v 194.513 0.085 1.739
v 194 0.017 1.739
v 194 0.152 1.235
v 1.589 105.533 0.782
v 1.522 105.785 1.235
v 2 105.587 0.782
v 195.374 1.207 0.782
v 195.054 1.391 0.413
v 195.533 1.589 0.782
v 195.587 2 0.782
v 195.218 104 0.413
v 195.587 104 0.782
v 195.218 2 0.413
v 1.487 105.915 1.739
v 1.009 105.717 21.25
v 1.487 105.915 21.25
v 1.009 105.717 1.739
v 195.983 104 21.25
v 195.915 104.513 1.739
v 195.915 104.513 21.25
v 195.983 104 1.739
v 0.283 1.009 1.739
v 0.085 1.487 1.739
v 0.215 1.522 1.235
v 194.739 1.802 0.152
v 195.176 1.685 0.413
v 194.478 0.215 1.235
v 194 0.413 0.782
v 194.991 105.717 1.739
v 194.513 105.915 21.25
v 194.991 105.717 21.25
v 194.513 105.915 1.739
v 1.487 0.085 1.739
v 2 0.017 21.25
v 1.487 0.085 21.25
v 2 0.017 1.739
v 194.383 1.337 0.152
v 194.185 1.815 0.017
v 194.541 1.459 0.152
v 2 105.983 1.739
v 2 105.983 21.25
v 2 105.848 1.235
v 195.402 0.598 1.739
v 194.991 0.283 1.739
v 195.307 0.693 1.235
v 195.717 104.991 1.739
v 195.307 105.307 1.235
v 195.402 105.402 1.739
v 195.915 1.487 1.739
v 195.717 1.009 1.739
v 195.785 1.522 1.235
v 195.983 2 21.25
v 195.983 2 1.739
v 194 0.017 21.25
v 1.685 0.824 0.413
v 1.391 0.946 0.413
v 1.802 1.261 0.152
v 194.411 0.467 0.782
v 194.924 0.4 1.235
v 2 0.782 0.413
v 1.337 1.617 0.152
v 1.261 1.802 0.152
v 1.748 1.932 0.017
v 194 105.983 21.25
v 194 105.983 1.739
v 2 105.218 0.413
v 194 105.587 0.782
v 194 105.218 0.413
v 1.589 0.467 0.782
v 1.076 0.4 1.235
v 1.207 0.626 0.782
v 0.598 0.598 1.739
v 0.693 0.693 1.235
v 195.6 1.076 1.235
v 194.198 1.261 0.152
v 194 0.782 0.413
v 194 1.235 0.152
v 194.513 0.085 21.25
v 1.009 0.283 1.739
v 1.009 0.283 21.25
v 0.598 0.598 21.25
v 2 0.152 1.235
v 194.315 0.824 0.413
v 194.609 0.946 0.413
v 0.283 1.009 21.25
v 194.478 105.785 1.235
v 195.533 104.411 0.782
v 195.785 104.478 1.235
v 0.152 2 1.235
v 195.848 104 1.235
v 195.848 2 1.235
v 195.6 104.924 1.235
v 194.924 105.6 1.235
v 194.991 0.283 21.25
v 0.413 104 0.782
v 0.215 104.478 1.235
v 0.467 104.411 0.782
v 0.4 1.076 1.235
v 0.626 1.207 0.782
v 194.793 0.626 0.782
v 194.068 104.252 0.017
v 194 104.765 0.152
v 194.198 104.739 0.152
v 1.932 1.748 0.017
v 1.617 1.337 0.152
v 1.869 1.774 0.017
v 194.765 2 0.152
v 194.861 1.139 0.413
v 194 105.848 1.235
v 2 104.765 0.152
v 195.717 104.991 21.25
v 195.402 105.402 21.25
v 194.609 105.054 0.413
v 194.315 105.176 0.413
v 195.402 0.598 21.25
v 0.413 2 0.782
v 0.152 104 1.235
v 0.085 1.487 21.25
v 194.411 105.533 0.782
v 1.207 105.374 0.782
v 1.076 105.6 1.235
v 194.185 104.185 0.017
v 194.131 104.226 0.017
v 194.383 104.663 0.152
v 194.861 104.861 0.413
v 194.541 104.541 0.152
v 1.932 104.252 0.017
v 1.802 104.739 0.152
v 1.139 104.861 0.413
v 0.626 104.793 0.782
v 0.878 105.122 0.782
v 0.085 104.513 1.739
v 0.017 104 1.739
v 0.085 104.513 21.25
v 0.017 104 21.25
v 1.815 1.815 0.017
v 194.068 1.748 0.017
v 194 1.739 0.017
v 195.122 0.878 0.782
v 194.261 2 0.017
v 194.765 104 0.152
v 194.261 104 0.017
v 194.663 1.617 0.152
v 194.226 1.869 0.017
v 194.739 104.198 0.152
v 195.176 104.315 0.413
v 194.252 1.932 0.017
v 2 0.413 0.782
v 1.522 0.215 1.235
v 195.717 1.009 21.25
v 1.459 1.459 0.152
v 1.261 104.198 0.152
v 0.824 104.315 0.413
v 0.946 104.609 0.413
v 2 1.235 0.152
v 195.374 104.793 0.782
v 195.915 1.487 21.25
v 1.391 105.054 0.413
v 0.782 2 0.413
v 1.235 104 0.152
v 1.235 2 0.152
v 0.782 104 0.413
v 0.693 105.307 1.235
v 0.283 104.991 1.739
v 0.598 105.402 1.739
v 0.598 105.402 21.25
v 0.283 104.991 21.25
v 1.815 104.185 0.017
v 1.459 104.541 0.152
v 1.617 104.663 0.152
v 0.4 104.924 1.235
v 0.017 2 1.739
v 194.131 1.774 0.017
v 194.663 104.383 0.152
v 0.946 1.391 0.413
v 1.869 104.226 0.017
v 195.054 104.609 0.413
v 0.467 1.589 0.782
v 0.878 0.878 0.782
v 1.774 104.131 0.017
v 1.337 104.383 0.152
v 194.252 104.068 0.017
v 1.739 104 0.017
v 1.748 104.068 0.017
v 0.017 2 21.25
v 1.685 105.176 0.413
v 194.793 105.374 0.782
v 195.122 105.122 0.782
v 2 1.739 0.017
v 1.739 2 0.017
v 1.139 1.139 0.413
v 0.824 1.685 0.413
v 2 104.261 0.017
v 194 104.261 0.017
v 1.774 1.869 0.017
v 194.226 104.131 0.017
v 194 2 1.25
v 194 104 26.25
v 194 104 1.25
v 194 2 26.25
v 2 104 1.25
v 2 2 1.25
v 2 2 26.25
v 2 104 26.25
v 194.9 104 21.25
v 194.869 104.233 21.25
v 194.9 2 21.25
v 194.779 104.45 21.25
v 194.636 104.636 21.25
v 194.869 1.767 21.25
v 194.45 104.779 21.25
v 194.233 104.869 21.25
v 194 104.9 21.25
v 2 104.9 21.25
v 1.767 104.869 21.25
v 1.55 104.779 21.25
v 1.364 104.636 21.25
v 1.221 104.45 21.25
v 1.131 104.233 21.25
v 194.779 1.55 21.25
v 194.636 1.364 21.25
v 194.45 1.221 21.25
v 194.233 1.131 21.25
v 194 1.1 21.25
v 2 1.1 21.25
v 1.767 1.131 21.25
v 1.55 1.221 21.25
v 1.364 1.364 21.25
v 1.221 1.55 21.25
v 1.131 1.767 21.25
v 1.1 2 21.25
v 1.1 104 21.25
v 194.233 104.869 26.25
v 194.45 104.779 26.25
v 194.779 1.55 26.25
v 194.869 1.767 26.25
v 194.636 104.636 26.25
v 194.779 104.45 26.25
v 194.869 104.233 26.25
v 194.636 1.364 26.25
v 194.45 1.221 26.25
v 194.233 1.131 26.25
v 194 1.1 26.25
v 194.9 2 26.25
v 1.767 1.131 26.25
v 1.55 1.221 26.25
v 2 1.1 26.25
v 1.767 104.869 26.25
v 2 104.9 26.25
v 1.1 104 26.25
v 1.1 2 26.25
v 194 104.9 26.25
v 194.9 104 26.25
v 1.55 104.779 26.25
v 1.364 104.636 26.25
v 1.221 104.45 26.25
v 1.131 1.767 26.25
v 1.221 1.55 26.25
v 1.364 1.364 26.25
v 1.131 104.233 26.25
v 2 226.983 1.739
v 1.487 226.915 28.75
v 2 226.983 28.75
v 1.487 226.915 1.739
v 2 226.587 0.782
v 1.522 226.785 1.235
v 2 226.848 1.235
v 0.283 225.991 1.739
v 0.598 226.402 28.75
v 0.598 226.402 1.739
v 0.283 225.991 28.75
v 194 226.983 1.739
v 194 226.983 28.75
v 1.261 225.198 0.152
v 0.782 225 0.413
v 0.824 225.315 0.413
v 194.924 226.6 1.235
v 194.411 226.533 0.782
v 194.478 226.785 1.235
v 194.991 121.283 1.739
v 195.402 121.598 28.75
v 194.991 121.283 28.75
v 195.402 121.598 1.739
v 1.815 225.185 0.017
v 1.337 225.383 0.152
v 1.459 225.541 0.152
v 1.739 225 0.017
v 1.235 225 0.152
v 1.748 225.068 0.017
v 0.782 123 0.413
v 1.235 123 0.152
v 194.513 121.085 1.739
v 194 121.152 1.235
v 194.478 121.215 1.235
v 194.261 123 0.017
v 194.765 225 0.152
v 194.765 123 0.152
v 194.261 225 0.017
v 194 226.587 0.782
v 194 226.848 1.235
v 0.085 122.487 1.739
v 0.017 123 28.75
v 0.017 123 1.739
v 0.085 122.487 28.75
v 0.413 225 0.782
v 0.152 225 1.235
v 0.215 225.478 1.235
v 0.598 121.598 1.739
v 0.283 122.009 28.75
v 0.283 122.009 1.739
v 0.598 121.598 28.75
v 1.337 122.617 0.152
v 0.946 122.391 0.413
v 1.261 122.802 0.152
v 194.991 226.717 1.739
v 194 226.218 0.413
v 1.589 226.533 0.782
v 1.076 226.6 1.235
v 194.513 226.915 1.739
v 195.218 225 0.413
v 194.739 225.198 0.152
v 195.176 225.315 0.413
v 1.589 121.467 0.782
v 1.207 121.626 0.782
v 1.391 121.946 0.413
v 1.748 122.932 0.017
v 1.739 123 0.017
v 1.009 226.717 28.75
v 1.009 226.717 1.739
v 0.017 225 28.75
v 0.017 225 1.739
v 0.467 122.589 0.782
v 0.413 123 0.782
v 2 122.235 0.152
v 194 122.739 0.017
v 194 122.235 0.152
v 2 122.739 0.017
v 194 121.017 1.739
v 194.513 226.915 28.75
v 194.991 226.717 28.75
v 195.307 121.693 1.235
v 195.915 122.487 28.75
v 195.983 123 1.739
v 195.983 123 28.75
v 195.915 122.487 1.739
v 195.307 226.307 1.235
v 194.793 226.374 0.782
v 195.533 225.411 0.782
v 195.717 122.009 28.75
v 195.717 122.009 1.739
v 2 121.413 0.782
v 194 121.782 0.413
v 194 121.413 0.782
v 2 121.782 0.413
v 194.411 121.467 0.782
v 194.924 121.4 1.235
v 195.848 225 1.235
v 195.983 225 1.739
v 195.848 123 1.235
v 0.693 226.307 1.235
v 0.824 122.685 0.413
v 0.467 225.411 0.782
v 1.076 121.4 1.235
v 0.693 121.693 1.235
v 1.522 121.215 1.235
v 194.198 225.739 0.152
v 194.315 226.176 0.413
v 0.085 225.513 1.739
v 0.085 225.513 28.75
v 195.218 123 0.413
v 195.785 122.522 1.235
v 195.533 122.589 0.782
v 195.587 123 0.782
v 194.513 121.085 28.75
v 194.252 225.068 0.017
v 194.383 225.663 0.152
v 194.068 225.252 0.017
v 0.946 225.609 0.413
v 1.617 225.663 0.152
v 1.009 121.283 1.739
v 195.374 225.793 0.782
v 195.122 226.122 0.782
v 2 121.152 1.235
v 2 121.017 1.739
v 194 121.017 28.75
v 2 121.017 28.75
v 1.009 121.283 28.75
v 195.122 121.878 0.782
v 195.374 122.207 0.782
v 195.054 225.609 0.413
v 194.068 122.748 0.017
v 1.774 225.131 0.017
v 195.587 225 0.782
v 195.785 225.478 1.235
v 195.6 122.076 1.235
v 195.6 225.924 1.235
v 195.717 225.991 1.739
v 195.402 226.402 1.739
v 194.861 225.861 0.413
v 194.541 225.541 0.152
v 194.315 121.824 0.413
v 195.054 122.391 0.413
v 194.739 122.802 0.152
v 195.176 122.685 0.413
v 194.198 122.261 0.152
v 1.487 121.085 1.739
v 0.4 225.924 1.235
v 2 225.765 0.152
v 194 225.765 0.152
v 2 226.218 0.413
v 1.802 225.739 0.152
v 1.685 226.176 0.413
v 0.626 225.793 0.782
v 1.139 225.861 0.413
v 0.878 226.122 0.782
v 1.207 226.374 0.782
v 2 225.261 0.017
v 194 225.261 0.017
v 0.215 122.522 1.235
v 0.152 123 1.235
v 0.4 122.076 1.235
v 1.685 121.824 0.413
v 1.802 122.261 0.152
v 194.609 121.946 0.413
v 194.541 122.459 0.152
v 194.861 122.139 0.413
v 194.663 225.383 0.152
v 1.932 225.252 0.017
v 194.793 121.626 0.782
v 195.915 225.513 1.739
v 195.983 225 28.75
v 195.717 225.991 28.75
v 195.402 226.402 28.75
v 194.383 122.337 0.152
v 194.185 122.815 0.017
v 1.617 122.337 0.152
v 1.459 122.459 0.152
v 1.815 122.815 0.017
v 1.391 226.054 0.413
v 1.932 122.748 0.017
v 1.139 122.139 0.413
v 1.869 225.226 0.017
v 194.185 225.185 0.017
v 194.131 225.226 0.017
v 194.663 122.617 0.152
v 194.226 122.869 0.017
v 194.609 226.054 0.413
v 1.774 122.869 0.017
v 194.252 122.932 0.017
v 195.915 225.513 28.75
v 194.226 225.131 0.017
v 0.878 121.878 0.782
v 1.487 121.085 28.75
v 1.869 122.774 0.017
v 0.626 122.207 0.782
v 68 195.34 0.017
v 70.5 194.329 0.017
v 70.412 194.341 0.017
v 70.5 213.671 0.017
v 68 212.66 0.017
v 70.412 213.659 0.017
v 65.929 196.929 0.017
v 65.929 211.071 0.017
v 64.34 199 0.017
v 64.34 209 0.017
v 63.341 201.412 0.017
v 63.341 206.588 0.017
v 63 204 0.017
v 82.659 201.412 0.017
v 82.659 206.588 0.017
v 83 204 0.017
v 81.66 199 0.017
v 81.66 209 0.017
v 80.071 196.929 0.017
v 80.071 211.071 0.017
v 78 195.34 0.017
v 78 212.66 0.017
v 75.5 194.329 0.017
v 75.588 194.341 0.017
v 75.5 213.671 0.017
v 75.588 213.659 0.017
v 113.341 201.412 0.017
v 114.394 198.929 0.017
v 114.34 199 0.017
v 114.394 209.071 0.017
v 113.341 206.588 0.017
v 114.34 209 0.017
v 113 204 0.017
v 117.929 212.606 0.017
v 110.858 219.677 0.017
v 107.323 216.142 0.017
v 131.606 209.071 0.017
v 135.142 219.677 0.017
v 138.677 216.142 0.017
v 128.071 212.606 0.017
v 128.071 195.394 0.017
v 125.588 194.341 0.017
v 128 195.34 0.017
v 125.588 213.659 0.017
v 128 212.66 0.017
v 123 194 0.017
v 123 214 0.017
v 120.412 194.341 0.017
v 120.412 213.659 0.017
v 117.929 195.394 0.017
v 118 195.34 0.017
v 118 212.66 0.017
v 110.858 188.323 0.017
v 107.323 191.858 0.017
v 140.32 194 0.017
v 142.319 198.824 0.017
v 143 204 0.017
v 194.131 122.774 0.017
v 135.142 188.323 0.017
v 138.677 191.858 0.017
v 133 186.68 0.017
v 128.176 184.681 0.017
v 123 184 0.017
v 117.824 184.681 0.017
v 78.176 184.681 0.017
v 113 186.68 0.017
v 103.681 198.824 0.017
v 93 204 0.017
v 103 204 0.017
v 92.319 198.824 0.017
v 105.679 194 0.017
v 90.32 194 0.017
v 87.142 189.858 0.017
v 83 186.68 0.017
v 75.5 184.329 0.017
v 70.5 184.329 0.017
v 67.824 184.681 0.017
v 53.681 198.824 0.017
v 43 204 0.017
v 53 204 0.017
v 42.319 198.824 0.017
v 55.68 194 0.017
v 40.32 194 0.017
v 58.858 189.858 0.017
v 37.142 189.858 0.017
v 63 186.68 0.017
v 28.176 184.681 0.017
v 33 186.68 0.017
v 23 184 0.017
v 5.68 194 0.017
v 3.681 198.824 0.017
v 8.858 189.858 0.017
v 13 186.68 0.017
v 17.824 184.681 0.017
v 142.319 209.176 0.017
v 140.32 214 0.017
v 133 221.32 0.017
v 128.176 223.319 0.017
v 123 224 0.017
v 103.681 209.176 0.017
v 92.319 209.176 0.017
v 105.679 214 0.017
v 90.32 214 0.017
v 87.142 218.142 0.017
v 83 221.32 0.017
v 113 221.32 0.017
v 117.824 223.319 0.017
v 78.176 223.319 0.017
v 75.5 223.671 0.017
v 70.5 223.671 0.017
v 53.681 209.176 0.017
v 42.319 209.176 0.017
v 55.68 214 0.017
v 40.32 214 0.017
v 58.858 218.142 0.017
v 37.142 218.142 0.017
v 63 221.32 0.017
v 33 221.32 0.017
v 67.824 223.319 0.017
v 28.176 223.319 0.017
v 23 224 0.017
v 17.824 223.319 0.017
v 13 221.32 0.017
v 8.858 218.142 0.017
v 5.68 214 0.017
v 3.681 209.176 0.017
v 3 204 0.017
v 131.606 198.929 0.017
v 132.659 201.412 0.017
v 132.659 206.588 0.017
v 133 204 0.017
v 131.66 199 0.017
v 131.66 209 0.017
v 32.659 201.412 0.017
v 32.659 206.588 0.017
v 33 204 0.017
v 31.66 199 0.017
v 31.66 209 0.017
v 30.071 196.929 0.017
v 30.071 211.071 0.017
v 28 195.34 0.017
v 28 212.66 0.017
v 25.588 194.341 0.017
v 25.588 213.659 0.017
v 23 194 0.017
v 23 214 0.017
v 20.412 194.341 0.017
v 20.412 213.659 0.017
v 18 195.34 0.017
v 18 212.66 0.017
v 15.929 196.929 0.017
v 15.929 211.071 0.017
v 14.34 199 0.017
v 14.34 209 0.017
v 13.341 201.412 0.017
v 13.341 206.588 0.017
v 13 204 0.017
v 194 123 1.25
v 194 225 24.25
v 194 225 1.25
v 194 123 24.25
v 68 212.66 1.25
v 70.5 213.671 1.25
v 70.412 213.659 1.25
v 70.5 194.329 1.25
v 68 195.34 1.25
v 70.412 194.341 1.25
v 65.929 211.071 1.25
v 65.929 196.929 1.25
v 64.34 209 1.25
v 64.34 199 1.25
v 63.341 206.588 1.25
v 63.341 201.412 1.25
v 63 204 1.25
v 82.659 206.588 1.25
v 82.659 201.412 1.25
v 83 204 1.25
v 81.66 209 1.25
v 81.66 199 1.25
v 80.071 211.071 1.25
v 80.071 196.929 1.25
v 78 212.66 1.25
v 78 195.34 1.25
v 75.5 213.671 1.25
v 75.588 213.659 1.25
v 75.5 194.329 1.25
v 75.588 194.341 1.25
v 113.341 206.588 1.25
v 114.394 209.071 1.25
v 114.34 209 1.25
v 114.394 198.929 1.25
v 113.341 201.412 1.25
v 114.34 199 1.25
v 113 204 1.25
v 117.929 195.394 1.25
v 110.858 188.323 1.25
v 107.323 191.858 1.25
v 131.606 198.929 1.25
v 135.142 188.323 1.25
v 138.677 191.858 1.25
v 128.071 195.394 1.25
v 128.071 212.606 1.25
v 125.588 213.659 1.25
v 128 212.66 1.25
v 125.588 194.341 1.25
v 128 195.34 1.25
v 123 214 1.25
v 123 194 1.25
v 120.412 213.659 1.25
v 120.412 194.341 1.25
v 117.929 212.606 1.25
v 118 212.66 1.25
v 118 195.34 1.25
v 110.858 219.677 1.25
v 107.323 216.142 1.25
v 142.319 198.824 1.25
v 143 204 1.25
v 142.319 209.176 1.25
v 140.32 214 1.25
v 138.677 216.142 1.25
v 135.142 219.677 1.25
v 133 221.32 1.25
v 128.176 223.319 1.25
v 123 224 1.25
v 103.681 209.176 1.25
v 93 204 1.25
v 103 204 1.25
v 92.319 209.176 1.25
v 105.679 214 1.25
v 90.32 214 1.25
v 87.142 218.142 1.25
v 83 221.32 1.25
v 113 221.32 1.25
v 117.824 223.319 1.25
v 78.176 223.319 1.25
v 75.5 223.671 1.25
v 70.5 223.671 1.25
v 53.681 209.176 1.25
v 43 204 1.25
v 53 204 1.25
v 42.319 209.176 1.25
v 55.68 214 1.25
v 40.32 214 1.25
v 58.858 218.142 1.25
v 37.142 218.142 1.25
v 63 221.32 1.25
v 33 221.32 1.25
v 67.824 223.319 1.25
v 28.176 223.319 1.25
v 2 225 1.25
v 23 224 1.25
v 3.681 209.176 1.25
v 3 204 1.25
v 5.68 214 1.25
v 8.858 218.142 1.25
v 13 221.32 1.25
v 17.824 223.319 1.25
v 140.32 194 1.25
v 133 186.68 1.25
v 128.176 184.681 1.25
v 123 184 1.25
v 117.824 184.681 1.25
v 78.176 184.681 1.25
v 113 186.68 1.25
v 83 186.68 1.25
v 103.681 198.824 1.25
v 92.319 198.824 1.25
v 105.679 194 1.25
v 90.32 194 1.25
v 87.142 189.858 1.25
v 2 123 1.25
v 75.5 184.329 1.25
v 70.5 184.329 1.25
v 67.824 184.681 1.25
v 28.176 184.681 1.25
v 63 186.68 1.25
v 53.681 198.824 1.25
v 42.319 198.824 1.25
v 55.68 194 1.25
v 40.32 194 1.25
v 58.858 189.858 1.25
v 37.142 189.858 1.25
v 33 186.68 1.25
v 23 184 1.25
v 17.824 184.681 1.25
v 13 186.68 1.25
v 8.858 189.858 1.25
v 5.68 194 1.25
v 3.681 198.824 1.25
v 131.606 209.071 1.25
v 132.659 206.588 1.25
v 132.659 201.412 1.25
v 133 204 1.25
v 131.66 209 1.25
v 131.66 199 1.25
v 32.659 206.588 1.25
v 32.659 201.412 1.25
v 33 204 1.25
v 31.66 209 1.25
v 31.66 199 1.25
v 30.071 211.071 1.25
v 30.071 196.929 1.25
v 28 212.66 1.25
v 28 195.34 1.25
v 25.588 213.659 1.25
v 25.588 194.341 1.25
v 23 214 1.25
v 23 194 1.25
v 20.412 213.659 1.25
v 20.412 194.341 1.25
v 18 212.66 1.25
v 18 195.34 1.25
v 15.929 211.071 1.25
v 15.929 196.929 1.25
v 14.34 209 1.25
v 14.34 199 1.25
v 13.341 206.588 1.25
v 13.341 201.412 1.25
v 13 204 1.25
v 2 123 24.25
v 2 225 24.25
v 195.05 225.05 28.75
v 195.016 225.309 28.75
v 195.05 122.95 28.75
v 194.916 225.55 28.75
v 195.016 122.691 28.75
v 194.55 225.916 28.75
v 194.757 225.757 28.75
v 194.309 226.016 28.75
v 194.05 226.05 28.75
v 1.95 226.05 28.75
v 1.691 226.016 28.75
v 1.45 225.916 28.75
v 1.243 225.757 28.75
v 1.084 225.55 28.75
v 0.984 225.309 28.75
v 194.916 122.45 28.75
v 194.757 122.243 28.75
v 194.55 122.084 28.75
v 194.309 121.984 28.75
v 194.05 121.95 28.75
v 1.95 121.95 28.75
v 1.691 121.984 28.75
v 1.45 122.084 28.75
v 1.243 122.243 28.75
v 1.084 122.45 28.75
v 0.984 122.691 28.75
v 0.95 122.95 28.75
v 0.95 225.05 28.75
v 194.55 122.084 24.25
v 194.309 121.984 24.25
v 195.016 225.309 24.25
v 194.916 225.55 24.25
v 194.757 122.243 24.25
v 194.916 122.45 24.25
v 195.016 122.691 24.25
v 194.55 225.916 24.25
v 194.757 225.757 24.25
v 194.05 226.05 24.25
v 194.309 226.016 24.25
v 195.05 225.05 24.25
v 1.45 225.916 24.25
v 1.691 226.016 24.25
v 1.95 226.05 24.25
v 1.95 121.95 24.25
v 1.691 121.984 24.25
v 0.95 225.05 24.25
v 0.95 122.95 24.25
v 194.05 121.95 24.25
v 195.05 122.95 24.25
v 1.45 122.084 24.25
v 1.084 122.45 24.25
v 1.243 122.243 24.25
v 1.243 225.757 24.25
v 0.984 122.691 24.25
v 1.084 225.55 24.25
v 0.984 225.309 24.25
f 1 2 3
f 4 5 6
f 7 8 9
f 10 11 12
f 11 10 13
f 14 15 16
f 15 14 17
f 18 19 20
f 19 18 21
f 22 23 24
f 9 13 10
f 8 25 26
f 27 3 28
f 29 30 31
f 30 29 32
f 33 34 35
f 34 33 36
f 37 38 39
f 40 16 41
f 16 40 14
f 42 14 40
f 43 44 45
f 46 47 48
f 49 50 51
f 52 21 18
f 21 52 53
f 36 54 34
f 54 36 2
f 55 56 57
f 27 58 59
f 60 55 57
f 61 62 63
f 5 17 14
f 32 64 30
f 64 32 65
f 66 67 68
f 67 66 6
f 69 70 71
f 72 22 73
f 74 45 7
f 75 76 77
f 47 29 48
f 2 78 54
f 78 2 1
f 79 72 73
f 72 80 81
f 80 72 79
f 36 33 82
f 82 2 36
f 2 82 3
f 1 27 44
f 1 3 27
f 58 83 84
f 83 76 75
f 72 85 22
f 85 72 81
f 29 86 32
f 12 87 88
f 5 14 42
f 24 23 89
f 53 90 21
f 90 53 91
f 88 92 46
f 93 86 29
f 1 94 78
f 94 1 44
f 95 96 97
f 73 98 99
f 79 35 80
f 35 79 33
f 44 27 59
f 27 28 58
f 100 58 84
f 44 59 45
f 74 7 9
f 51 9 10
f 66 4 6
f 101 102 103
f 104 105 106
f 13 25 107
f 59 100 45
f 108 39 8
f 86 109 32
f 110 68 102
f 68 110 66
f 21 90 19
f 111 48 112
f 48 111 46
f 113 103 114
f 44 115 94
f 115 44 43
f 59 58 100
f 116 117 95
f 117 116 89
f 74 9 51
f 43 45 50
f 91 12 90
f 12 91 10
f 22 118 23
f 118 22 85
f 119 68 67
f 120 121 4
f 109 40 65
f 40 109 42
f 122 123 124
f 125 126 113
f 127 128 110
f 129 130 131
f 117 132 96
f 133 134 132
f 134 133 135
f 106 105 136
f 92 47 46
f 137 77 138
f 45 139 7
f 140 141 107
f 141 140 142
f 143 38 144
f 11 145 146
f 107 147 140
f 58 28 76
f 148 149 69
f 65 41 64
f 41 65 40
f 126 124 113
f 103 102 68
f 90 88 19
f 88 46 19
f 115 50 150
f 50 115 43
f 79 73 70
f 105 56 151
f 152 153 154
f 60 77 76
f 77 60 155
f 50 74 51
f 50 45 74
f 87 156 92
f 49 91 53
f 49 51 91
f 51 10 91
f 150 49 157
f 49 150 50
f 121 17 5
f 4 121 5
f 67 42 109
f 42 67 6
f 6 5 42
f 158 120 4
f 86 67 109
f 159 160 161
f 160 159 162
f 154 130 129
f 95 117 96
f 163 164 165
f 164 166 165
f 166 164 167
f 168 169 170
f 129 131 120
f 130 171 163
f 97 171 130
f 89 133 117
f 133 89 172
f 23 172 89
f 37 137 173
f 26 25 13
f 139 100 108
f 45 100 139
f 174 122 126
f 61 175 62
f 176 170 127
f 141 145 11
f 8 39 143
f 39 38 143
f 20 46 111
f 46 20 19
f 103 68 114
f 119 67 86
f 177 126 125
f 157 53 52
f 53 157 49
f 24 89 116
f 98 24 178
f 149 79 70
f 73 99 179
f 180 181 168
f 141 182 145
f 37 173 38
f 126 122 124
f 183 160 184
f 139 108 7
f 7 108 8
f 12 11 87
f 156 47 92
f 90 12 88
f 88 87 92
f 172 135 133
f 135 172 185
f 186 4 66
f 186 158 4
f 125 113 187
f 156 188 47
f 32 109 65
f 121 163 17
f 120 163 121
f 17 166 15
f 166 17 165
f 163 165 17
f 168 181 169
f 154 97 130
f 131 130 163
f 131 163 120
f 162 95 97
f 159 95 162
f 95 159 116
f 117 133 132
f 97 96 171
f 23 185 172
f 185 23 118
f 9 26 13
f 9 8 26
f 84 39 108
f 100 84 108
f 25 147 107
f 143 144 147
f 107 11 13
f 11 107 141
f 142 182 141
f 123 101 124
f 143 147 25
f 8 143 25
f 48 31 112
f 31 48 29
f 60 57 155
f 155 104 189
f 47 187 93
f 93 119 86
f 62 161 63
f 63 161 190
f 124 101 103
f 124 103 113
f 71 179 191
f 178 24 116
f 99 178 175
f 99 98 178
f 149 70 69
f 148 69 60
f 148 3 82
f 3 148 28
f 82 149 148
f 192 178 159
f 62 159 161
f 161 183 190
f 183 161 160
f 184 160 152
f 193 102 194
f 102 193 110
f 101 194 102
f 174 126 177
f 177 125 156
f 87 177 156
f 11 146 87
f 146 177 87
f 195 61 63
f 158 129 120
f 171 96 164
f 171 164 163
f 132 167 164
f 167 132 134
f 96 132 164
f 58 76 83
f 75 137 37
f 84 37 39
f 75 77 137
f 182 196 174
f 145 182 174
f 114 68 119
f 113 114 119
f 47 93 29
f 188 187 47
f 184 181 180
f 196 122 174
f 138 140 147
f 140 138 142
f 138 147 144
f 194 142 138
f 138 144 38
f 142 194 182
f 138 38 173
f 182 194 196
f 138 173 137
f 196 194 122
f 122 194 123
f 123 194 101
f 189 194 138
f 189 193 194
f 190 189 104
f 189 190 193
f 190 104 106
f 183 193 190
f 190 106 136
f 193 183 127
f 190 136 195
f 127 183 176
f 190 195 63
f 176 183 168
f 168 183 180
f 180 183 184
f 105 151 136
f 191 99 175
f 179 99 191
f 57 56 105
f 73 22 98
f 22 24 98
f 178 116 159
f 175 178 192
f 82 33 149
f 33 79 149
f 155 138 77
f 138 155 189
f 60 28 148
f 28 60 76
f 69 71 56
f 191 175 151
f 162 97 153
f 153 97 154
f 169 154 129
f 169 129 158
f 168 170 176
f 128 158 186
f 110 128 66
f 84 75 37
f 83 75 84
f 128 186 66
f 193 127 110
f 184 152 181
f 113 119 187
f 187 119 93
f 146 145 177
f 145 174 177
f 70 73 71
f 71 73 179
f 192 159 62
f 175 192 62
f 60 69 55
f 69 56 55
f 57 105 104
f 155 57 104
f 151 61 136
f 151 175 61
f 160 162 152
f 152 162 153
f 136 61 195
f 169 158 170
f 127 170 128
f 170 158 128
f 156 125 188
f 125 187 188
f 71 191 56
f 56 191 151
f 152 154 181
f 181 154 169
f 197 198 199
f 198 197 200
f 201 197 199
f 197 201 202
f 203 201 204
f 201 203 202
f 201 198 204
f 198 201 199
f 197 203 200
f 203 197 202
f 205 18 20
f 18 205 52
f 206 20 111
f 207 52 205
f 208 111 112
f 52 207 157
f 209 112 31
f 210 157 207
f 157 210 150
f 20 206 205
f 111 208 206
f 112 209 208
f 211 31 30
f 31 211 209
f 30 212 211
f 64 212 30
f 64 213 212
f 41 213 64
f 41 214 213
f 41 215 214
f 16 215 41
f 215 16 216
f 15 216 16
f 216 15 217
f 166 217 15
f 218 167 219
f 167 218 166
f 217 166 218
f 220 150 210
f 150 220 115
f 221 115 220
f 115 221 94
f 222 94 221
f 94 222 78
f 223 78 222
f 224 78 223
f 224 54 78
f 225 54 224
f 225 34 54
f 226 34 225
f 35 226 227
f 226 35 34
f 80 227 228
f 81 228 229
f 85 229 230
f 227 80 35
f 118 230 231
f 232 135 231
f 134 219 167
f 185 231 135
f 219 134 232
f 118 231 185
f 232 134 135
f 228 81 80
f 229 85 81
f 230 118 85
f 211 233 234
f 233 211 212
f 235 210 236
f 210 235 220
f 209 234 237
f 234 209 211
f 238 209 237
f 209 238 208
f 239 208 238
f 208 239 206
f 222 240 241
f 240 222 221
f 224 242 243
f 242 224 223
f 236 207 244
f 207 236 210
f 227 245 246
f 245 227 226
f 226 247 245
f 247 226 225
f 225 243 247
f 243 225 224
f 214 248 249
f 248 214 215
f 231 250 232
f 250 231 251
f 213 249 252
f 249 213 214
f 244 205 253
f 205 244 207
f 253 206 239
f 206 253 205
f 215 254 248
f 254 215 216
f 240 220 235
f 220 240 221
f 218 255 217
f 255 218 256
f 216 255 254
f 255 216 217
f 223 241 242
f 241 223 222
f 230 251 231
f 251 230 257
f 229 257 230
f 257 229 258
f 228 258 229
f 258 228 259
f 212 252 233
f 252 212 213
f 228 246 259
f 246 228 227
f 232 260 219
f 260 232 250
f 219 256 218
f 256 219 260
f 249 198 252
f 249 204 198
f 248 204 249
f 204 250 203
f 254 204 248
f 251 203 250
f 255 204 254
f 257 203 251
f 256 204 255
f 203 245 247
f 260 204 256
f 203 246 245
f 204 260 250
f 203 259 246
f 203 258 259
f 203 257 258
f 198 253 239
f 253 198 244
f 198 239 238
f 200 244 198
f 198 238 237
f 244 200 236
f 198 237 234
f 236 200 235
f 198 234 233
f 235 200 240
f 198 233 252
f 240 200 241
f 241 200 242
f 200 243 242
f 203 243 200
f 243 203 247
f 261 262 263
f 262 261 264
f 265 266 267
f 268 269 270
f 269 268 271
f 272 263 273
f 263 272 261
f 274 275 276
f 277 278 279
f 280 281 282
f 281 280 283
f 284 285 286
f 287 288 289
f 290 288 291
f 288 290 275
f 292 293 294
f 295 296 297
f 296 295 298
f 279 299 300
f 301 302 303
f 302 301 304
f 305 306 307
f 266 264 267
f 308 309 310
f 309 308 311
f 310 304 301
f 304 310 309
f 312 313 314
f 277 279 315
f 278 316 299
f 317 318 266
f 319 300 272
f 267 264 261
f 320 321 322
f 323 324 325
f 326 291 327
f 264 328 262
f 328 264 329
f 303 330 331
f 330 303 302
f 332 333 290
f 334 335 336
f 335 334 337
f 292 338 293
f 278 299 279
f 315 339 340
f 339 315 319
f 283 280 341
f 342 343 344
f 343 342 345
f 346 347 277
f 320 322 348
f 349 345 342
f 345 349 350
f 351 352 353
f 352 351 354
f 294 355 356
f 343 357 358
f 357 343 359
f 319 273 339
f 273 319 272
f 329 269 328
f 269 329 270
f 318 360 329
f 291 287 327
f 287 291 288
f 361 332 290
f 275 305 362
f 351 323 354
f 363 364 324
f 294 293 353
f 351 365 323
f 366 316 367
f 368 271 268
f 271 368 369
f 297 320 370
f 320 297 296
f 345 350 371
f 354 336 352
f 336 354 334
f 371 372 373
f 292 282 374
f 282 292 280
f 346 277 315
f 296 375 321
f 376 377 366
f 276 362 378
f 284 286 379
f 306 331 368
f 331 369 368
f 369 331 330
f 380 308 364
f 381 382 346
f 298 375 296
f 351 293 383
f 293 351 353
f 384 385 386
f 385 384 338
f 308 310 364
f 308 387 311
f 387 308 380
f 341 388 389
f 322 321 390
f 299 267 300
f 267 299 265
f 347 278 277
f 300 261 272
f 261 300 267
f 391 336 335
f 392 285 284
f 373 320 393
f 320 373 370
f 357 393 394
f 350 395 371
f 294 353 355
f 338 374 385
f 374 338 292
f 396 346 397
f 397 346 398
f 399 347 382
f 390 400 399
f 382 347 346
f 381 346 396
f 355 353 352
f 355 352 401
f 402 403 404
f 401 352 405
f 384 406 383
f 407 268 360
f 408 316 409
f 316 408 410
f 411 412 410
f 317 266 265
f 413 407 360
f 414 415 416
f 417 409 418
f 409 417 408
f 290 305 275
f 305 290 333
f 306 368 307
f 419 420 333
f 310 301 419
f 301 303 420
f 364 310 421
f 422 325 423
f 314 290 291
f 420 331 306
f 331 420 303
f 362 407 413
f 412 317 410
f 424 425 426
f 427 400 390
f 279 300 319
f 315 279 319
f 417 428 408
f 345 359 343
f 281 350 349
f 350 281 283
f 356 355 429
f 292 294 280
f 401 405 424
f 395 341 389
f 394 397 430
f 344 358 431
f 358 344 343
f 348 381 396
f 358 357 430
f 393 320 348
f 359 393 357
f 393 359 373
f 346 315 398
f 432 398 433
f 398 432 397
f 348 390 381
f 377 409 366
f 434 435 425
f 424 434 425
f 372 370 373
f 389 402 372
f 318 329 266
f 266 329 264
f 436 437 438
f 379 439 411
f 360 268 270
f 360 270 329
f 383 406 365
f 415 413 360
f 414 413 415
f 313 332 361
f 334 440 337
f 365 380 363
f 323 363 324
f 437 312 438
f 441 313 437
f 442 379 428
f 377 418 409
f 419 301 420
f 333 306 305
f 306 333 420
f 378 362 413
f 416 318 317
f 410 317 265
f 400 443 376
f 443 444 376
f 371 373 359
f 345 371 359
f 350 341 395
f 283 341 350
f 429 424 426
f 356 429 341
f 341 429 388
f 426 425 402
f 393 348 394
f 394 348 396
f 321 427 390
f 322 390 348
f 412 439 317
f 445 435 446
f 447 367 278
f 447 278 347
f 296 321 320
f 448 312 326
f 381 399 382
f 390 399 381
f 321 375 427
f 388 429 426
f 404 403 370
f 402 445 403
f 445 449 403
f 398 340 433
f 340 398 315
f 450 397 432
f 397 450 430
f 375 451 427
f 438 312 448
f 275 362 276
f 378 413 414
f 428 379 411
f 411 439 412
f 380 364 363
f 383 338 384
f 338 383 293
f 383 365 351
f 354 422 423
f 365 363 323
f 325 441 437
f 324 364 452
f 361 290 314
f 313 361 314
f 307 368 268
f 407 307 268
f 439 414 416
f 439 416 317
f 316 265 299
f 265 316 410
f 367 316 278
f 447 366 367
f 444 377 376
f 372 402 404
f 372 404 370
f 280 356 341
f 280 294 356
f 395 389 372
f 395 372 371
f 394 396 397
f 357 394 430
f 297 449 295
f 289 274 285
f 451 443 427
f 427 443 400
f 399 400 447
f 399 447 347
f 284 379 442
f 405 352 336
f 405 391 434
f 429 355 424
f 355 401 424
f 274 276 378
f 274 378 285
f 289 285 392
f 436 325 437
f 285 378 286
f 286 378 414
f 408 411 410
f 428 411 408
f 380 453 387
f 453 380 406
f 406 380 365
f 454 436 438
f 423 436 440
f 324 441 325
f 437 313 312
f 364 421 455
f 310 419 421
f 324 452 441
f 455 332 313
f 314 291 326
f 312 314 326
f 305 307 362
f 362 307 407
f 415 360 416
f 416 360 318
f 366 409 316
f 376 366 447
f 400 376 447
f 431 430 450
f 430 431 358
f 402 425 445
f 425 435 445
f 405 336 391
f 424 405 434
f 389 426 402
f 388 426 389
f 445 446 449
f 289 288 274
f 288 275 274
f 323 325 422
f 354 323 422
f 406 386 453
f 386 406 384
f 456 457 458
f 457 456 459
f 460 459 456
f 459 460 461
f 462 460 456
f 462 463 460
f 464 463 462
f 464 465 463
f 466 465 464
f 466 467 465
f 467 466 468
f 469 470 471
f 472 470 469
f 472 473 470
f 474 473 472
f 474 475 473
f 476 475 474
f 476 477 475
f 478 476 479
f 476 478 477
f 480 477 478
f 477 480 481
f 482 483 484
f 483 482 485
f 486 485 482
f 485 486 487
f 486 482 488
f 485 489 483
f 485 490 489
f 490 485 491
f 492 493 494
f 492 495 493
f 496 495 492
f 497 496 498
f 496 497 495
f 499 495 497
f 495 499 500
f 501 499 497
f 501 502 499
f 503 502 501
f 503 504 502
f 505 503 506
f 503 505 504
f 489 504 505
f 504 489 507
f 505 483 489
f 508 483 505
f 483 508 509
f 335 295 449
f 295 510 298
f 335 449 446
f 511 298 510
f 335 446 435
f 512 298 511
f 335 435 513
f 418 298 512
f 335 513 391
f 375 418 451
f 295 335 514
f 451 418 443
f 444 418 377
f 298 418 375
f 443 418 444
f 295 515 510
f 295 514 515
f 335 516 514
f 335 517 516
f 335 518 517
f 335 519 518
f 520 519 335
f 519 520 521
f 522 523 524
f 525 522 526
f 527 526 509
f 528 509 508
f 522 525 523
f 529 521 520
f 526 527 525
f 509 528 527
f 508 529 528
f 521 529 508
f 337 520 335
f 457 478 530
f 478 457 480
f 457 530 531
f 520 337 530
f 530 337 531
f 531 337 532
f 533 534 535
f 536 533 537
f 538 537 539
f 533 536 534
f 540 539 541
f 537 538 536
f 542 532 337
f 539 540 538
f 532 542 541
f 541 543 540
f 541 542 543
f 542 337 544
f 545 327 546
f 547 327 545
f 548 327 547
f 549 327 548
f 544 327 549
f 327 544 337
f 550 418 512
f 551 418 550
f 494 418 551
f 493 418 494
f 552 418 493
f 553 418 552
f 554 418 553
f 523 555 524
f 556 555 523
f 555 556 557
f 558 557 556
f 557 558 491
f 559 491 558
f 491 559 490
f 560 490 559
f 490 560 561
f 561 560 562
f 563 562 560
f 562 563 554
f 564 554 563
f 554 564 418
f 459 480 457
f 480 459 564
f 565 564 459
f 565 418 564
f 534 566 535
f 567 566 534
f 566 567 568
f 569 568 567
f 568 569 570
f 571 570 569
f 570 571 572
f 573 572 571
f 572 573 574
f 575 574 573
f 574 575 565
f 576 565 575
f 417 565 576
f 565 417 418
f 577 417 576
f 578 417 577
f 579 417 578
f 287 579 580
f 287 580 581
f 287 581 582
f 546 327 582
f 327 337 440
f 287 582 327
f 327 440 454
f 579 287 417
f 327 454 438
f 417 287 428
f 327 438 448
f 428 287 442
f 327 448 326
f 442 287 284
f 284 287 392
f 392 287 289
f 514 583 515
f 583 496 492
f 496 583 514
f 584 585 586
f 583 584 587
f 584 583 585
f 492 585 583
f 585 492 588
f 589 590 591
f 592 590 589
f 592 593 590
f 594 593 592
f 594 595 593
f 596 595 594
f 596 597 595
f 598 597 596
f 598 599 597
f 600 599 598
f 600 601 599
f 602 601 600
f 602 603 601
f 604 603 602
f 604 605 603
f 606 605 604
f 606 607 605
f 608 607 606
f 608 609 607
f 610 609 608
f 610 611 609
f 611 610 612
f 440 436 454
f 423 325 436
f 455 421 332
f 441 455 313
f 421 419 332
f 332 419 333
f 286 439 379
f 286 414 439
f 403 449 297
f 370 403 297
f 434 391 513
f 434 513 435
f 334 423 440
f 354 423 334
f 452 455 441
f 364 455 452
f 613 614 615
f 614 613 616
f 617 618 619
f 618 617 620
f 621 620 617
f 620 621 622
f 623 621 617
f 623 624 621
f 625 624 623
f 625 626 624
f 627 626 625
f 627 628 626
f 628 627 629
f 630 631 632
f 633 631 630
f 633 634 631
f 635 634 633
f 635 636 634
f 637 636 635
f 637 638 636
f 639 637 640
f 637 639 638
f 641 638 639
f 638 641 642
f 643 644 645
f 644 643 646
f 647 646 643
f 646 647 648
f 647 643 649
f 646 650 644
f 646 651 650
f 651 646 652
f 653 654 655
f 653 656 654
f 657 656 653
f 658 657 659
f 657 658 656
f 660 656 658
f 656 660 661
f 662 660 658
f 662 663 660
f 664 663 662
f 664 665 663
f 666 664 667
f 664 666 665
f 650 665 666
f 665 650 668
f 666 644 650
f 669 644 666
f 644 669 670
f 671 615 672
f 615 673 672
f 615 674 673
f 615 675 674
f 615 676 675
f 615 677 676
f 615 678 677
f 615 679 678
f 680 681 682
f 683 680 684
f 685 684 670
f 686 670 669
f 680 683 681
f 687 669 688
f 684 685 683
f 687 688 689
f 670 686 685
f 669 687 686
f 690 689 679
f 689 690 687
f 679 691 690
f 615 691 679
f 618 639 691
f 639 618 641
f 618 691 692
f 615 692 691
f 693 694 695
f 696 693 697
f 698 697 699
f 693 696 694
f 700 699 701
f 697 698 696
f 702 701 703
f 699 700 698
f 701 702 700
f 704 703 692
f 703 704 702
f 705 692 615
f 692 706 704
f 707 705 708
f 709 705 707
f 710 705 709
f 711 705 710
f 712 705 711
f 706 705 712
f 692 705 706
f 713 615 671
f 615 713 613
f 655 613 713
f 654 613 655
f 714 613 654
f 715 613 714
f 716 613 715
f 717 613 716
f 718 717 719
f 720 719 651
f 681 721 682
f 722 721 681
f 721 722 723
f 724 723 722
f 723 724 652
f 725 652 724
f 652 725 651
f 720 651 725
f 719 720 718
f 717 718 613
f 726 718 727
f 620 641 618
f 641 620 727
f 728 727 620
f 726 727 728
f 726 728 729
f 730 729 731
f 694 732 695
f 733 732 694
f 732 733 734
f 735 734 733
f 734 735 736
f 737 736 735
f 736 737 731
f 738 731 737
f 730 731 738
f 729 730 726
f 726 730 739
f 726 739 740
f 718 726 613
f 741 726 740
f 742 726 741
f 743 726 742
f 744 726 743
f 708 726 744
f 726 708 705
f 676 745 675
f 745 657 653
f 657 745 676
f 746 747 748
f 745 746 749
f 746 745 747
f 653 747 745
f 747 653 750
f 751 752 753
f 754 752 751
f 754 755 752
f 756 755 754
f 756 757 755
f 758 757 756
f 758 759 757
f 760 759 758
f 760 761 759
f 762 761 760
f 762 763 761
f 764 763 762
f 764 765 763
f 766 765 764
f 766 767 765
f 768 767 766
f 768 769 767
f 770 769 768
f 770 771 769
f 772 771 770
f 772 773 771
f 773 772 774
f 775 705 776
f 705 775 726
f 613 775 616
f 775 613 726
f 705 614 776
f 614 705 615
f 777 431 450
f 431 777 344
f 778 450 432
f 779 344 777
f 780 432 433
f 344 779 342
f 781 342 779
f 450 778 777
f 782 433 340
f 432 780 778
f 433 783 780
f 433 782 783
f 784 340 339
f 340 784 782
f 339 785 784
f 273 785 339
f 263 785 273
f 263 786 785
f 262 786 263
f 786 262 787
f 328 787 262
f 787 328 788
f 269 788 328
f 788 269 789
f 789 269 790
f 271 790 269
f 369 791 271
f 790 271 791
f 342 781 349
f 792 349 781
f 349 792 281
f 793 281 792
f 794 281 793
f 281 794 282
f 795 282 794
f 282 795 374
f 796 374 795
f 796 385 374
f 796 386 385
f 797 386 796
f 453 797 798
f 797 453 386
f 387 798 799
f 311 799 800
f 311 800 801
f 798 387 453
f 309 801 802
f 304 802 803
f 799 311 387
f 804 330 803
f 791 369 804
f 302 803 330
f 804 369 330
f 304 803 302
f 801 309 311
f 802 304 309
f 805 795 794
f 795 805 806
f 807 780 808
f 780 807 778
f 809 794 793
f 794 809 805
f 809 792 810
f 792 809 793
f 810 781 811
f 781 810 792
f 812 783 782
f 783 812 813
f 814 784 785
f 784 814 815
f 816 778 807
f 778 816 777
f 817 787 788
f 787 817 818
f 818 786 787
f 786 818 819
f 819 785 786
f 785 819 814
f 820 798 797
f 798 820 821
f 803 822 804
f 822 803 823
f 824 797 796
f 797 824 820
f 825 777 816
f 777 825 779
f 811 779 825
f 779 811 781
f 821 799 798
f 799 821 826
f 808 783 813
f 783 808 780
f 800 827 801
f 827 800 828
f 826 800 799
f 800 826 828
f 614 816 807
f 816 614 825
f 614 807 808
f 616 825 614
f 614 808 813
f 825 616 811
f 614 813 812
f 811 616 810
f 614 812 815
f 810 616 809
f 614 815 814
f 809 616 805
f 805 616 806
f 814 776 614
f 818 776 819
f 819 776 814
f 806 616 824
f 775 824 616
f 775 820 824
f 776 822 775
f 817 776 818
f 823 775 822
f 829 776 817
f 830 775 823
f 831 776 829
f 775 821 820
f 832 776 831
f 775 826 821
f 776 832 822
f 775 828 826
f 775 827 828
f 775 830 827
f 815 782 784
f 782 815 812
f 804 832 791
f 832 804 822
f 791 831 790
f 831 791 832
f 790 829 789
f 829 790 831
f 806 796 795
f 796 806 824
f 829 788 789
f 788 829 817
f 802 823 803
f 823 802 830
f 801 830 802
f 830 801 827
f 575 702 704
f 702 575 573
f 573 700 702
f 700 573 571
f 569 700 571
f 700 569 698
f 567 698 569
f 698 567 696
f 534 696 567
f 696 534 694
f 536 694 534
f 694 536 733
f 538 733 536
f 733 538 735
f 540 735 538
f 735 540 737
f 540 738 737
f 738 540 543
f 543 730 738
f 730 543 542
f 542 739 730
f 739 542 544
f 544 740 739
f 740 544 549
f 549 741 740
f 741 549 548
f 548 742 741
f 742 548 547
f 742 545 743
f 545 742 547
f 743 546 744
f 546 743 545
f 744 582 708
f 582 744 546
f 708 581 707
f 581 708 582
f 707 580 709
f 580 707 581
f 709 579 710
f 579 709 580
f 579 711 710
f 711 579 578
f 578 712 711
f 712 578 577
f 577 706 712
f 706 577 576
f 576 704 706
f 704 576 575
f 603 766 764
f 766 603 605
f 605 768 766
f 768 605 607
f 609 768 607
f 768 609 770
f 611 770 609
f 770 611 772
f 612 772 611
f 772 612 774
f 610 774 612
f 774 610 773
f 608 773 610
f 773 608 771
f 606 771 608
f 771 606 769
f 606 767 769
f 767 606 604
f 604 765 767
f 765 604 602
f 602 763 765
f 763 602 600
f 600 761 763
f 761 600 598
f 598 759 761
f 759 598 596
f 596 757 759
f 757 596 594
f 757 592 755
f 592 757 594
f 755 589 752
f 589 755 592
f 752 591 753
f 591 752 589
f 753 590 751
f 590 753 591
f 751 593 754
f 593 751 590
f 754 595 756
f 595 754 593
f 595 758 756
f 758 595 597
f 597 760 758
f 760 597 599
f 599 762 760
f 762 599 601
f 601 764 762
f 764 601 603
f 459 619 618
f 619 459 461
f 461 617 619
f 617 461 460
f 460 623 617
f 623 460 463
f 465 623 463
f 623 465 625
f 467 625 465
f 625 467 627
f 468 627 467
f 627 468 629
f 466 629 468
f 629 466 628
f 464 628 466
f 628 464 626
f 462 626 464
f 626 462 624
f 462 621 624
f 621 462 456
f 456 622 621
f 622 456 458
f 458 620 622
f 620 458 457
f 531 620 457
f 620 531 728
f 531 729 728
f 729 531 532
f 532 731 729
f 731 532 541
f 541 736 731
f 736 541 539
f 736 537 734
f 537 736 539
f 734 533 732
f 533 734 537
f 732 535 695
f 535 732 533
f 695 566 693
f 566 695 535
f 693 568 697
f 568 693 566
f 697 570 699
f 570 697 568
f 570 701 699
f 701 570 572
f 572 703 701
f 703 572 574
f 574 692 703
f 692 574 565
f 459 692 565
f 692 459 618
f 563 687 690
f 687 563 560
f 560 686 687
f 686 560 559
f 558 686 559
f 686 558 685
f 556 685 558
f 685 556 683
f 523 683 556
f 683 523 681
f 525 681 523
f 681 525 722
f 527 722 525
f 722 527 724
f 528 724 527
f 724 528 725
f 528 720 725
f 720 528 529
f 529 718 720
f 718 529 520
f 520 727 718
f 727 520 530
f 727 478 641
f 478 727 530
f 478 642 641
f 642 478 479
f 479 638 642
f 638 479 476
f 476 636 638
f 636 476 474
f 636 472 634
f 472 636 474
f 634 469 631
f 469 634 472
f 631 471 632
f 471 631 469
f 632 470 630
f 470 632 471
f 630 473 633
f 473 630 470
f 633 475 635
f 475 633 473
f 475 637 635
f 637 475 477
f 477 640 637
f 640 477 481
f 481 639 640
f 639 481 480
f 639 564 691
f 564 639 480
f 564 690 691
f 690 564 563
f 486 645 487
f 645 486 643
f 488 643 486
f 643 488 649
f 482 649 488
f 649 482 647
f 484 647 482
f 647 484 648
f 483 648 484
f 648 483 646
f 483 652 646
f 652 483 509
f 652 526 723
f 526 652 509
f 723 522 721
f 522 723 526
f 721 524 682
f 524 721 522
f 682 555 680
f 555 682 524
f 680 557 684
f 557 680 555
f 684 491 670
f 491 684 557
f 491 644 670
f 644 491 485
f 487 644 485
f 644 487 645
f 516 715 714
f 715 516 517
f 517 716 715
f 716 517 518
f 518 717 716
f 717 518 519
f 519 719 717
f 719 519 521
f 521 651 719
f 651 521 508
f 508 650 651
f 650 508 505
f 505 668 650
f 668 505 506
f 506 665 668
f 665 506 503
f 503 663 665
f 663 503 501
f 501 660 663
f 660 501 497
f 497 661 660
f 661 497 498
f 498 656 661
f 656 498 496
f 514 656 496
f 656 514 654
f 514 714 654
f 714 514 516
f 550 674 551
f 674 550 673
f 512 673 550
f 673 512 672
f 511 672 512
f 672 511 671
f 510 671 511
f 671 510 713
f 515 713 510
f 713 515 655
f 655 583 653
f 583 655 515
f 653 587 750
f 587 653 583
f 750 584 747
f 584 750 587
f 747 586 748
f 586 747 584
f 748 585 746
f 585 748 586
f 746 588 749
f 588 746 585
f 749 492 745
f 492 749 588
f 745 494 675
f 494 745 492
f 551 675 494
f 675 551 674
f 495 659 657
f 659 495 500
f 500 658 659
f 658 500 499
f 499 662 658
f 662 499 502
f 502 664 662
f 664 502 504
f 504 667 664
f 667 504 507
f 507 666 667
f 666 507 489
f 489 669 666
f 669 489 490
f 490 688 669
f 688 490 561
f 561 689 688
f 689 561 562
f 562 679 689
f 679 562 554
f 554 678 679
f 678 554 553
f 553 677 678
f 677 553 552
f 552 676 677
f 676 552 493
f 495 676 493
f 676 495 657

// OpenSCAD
//-----------------------------------------------------------------------
// Yet Another Parameterized Projectbox generator
//
//  This is a box for <template>
//
//  Version 3.0.5 (03-26-2024)
//
// This design is parameterized based on the size of a PCB.
//
//  You might need to adjust the number of elements:
//
//      Preferences->Advanced->Turn of rendering at 250000 elements
//                                                  ^^^^^^
//
//-----------------------------------------------------------------------

include <../YAPPgenerator_v3.scad>

// Note: length/lengte refers to X axis, 
//       width/breedte to Y, 
//       height/hoogte to Z

/*
            padding-back>|<---- pcb length ---->|<padding-front
                                 RIGHT
                   0    X-ax ---> 
               +----------------------------------------+   ---
               |                                        |    ^
               |                                        |   padding-right 
             ^ |                                        |    v
             | |    -5,y +----------------------+       |   ---              
        B    Y |         | 0,y              x,y |       |     ^              F
        A    - |         |                      |       |     |              R
        C    a |         |                      |       |     | pcb width    O
        K    x |         |                      |       |     |              N
               |         | 0,0              x,0 |       |     v              T
               |   -5,0  +----------------------+       |   ---
               |                                        |    padding-left
             0 +----------------------------------------+   ---
               0    X-ax --->
                                 LEFT
*/


//-- which part(s) do you want to print?
printBaseShell        = true;
printLidShell         = true;
printSwitchExtenders  = false;

//-- pcb dimensions -- very important!!!
pcbLength           = 150; // Front to back
pcbWidth            = 100; // Side to side
pcbThickness        = 1.6;
                            
//-- padding between pcb and inside wall
paddingFront        = 41;
paddingBack         = 1;
paddingRight        = 1;
paddingLeft         = 1;

//-- Edit these parameters for your own box dimensions
wallThickness       = 2.0;
basePlaneThickness  = 1.25;
lidPlaneThickness   = 1.25;

//-- Total height of box = lidPlaneThickness 
//                       + lidWallHeight 
//--                     + baseWallHeight 
//                       + basePlaneThickness
//-- space between pcb and lidPlane :=
//--      (bottonWallHeight+lidWallHeight) - (standoffHeight+pcbThickness)
baseWallHeight      = 25;
lidWallHeight       = 23;

//-- ridge where base and lid off box can overlap
//-- Make sure this isn't less than lidWallHeight
ridgeHeight         = 5.0;
ridgeSlack          = 0.2;
roundRadius         = 2.0;

//-- How much the PCB needs to be raised from the base
//-- to leave room for solderings and whatnot
standoffHeight      = 10.0;  //-- used only for pushButton and showPCB
standoffPinDiameter = 2.4;
standoffHoleSlack   = 0.4;
standoffDiameter    = 8;



//-- C O N T R O L -------------//-> Default ---------
showSideBySide      = true;     //-> true
previewQuality      = 5;        //-> from 1 to 32, Default = 5
renderQuality       = 6;        //-> from 1 to 32, Default = 8
onLidGap            = 2;
shiftLid            = 5;
colorLid            = "gray";   
alphaLid            = 1;//0.2;   
colorBase           = "yellow";
alphaBase           = 1;//0.2;
hideLidWalls        = false;    //-> false
hideBaseWalls       = false;    //-> false
showOrientation     = true;
showPCB             = false;
showSwitches        = false;
showPCBmarkers      = false;
showShellZero       = false;
showCenterMarkers   = false;
inspectX            = 0;        //-> 0=none (>0 from Back)
inspectY            = 0;        //-> 0=none (>0 from Right)
inspectZ            = 0;        //-> 0=none (>0 from Bottom)
inspectXfromBack    = true;     // View from the inspection cut foreward
inspectYfromLeft    = true;     //-> View from the inspection cut to the right
inspectZfromTop     = false;    //-> View from the inspection cut down
//-- C O N T R O L ---------------------------------------


//===================================================================
//  *** Cutouts ***
//    There are 6 cutouts one for each surface:
//      cutoutsBase (Bottom), cutoutsLid (Top), cutoutsFront, cutoutsBack, cutoutsLeft, cutoutsRight
//-------------------------------------------------------------------
//  Default origin =  yappCoordPCB : pcb[0,0,0]
//
//                        Required                Not Used        Note
//----------------------+-----------------------+---------------+------------------------------------
//  yappRectangle       | width, length         | radius        |
//  yappCircle          | radius                | width, length |
//  yappRoundedRect     | width, length, radius |               |     
//  yappCircleWithFlats | width, radius         | length        | length=distance between flats
//  yappCircleWithKey   | width, length, radius |               | width = key width length=key depth
//  yappPolygon         | width, length         | radius        | yappPolygonDef object must be
//                      |                       |               | provided
//  yappRing            | width, length, radius |               | radius = outer radius, 
//                      |                       |               | length = inner radius
//                      |                       |               | width = connection between rings
//                      |                       |               |   0 = No connectors
//                      |                       |               |   positive = 2 connectors
//                      |                       |               |   negative = 4 connectors
//----------------------+-----------------------+---------------+------------------------------------
//
//  Parameters:
//   Required:
//    p(0) = from Back
//    p(1) = from Left
//    p(2) = width
//    p(3) = length
//    p(4) = radius
//    p(5) = shape : { yappRectangle | yappCircle | yappPolygon | yappRoundedRect 
//                    | yappCircleWithFlats | yappCircleWithKey }
//  Optional:
//    p(6) = depth : Default = 0/Auto : 0 = Auto (plane thickness)
//    p(7) = angle : Default = 0
//    n(a) = { yappPolygonDef } : Required if shape = yappPolygon specified -
//    n(b) = { yappMaskDef } : If a yappMaskDef object is added it will be used as a mask 
//                             for the cutout.
//    n(c) = { [yappMaskDef, hOffset, vOffset, rotation] } : If a list for a mask is added 
//                              it will be used as a mask for the cutout. With the Rotation 
//                              and offsets applied. This can be used to fine tune the mask
//                              placement within the opening.
//    n(d) = { <yappCoordPCB> | yappCoordBox | yappCoordBoxInside }
//    n(e) = { <yappOrigin>, yappCenter }
//    n(f) = { <yappGlobalOrigin>, yappLeftOrigin } // Only affects Top(lid), Back and Right Faces
//    n(g) = [yappPCBName, "XXX"] : Specify a PCB. Defaults to [yappPCBName, "Main"]
//    n(h) = { yappFromInside } Make the cut from the inside towards the outside
//-------------------------------------------------------------------

cutoutsBase = 
[
];

cutoutsLid  = 
[
 [20,20, 0, 10, 20, yappRing, yappCenter]
 ,[70,20, 5, 10, 20, yappRing, yappDefault, 0, yappCenter]
 ,[120,20, -5, 10, 20, yappRing, yappDefault, 45, yappCenter]
];

cutoutsFront = 
[
];  


cutoutsBack = 
[
];


cutoutsLeft = 
[
];

cutoutsRight = 
[
];


//---- This is where the magic happens ----
YAPPgenerate();
